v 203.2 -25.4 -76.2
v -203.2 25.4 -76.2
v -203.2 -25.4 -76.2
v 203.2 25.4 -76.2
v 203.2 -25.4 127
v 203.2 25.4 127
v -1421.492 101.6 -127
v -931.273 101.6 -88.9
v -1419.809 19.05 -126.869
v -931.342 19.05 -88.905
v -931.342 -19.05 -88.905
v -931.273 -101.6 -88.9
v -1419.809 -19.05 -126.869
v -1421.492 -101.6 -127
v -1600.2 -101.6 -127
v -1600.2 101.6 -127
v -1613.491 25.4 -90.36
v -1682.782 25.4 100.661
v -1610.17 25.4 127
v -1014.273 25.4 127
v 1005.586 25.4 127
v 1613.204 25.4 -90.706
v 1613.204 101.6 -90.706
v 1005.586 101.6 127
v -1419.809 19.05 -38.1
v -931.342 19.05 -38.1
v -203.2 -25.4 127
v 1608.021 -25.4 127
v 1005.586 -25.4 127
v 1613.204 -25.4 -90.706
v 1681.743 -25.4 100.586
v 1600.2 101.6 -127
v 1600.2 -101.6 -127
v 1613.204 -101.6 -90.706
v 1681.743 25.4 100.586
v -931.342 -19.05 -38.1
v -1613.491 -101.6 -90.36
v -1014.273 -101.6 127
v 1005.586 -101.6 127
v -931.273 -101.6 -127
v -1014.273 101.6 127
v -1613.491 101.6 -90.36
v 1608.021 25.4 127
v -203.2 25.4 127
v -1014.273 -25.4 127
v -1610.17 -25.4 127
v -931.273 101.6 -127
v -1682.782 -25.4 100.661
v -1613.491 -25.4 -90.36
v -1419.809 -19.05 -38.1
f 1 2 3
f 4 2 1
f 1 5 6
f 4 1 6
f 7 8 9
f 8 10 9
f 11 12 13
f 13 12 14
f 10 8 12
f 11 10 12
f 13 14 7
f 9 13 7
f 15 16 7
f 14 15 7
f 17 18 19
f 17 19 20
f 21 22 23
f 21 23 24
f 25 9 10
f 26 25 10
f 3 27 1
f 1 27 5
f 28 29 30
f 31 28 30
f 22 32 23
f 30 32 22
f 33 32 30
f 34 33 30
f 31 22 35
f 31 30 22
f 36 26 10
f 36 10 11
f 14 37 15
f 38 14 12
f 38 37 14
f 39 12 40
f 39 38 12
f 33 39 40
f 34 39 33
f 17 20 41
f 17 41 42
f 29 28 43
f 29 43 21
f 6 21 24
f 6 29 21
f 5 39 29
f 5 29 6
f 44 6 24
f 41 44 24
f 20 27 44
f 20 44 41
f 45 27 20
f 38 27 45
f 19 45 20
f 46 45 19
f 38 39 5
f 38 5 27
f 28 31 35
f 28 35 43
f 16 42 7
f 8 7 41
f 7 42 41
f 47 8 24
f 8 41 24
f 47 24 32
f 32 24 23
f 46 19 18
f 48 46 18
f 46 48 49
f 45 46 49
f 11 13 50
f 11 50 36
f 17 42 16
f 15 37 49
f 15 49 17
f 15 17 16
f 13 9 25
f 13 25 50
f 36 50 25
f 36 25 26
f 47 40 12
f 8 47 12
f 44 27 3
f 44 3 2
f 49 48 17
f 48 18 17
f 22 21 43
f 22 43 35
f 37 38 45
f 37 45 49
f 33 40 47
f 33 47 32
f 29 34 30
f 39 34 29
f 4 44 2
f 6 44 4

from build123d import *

# Parameters (mm, degrees)
F1_DEPTH = 101.6
F2_DEPTH = 25.4
F3_W     = 406.4
F3_H     = 50.8
F4_DEPTH = 203.2
F5_W     = 488.4674
F5_H     = 38.1
F6_DEPTH = 88.9
F8_DEPTH = 203.2


# Not quite as in the source:
# - a feature names something its author has since deleted; it is built from what else it names


with BuildPart() as f1:
    # F0 (on Front) → F1 (new body, symmetric)
    with BuildSketch(Plane.XZ):
        Polygon((-1613.4907807573, -90.3599756084), (-1600.2, -127), (1600.2, -127), (1613.2038848964, -90.7061572542), (1072.3230234564, 103.0884903417), (1005.586, 127), (-1014.2728, 127), (-1080.098633757, 103.1223760313), align=None)
    extrude(amount=F1_DEPTH, both=True)

    # F0 (on Front) → F2 (join, symmetric)
    with BuildSketch(Plane.XZ):
        Polygon((-1088.7599889401, 127), (-1610.1703115208, 127), (-1682.781622222, 100.6610161415), (-1613.4907807573, -90.3599756084), (-1080.098633757, 103.1223760313), align=None)
        Polygon((1072.3230234564, 103.0884903417), (1613.2038848964, -90.7061572542), (1681.7427875358, 100.5859200125), (1608.0210902906, 127), (1080.8903862863, 127), align=None)
        Polygon((1080.8903862863, 127), (1005.586, 127), (1072.3230234564, 103.0884903417), align=None)
        Polygon((-1014.2728, 127), (-1088.7599889401, 127), (-1080.098633757, 103.1223760313), align=None)
    extrude(amount=F2_DEPTH, both=True)

    # F3 (on face) → F4 (cut)
    with BuildSketch(Plane.XY.offset(127)):
        Rectangle(F3_W, F3_H)
    extrude(amount=-F4_DEPTH, mode=Mode.SUBTRACT)

    # F5 (on face) → F6 (cut)
    with BuildSketch(Plane(origin=(0, 0, -127), x_dir=(1, 0, 0), z_dir=(0, 0, -1))):
        with Locations((-1175.5755, 0)):
            Rectangle(F5_W, F5_H)
    extrude(amount=-F6_DEPTH, mode=Mode.SUBTRACT)

    # F7 (on face) → F8 (cut)
    with BuildSketch(Plane.XZ.offset(101.6)):
        Polygon((-1421.4916229248, -127), (-931.272983551, -127), (-931.272983551, -88.9), align=None)
    extrude(amount=-F8_DEPTH, mode=Mode.SUBTRACT)


solid = f1.part
